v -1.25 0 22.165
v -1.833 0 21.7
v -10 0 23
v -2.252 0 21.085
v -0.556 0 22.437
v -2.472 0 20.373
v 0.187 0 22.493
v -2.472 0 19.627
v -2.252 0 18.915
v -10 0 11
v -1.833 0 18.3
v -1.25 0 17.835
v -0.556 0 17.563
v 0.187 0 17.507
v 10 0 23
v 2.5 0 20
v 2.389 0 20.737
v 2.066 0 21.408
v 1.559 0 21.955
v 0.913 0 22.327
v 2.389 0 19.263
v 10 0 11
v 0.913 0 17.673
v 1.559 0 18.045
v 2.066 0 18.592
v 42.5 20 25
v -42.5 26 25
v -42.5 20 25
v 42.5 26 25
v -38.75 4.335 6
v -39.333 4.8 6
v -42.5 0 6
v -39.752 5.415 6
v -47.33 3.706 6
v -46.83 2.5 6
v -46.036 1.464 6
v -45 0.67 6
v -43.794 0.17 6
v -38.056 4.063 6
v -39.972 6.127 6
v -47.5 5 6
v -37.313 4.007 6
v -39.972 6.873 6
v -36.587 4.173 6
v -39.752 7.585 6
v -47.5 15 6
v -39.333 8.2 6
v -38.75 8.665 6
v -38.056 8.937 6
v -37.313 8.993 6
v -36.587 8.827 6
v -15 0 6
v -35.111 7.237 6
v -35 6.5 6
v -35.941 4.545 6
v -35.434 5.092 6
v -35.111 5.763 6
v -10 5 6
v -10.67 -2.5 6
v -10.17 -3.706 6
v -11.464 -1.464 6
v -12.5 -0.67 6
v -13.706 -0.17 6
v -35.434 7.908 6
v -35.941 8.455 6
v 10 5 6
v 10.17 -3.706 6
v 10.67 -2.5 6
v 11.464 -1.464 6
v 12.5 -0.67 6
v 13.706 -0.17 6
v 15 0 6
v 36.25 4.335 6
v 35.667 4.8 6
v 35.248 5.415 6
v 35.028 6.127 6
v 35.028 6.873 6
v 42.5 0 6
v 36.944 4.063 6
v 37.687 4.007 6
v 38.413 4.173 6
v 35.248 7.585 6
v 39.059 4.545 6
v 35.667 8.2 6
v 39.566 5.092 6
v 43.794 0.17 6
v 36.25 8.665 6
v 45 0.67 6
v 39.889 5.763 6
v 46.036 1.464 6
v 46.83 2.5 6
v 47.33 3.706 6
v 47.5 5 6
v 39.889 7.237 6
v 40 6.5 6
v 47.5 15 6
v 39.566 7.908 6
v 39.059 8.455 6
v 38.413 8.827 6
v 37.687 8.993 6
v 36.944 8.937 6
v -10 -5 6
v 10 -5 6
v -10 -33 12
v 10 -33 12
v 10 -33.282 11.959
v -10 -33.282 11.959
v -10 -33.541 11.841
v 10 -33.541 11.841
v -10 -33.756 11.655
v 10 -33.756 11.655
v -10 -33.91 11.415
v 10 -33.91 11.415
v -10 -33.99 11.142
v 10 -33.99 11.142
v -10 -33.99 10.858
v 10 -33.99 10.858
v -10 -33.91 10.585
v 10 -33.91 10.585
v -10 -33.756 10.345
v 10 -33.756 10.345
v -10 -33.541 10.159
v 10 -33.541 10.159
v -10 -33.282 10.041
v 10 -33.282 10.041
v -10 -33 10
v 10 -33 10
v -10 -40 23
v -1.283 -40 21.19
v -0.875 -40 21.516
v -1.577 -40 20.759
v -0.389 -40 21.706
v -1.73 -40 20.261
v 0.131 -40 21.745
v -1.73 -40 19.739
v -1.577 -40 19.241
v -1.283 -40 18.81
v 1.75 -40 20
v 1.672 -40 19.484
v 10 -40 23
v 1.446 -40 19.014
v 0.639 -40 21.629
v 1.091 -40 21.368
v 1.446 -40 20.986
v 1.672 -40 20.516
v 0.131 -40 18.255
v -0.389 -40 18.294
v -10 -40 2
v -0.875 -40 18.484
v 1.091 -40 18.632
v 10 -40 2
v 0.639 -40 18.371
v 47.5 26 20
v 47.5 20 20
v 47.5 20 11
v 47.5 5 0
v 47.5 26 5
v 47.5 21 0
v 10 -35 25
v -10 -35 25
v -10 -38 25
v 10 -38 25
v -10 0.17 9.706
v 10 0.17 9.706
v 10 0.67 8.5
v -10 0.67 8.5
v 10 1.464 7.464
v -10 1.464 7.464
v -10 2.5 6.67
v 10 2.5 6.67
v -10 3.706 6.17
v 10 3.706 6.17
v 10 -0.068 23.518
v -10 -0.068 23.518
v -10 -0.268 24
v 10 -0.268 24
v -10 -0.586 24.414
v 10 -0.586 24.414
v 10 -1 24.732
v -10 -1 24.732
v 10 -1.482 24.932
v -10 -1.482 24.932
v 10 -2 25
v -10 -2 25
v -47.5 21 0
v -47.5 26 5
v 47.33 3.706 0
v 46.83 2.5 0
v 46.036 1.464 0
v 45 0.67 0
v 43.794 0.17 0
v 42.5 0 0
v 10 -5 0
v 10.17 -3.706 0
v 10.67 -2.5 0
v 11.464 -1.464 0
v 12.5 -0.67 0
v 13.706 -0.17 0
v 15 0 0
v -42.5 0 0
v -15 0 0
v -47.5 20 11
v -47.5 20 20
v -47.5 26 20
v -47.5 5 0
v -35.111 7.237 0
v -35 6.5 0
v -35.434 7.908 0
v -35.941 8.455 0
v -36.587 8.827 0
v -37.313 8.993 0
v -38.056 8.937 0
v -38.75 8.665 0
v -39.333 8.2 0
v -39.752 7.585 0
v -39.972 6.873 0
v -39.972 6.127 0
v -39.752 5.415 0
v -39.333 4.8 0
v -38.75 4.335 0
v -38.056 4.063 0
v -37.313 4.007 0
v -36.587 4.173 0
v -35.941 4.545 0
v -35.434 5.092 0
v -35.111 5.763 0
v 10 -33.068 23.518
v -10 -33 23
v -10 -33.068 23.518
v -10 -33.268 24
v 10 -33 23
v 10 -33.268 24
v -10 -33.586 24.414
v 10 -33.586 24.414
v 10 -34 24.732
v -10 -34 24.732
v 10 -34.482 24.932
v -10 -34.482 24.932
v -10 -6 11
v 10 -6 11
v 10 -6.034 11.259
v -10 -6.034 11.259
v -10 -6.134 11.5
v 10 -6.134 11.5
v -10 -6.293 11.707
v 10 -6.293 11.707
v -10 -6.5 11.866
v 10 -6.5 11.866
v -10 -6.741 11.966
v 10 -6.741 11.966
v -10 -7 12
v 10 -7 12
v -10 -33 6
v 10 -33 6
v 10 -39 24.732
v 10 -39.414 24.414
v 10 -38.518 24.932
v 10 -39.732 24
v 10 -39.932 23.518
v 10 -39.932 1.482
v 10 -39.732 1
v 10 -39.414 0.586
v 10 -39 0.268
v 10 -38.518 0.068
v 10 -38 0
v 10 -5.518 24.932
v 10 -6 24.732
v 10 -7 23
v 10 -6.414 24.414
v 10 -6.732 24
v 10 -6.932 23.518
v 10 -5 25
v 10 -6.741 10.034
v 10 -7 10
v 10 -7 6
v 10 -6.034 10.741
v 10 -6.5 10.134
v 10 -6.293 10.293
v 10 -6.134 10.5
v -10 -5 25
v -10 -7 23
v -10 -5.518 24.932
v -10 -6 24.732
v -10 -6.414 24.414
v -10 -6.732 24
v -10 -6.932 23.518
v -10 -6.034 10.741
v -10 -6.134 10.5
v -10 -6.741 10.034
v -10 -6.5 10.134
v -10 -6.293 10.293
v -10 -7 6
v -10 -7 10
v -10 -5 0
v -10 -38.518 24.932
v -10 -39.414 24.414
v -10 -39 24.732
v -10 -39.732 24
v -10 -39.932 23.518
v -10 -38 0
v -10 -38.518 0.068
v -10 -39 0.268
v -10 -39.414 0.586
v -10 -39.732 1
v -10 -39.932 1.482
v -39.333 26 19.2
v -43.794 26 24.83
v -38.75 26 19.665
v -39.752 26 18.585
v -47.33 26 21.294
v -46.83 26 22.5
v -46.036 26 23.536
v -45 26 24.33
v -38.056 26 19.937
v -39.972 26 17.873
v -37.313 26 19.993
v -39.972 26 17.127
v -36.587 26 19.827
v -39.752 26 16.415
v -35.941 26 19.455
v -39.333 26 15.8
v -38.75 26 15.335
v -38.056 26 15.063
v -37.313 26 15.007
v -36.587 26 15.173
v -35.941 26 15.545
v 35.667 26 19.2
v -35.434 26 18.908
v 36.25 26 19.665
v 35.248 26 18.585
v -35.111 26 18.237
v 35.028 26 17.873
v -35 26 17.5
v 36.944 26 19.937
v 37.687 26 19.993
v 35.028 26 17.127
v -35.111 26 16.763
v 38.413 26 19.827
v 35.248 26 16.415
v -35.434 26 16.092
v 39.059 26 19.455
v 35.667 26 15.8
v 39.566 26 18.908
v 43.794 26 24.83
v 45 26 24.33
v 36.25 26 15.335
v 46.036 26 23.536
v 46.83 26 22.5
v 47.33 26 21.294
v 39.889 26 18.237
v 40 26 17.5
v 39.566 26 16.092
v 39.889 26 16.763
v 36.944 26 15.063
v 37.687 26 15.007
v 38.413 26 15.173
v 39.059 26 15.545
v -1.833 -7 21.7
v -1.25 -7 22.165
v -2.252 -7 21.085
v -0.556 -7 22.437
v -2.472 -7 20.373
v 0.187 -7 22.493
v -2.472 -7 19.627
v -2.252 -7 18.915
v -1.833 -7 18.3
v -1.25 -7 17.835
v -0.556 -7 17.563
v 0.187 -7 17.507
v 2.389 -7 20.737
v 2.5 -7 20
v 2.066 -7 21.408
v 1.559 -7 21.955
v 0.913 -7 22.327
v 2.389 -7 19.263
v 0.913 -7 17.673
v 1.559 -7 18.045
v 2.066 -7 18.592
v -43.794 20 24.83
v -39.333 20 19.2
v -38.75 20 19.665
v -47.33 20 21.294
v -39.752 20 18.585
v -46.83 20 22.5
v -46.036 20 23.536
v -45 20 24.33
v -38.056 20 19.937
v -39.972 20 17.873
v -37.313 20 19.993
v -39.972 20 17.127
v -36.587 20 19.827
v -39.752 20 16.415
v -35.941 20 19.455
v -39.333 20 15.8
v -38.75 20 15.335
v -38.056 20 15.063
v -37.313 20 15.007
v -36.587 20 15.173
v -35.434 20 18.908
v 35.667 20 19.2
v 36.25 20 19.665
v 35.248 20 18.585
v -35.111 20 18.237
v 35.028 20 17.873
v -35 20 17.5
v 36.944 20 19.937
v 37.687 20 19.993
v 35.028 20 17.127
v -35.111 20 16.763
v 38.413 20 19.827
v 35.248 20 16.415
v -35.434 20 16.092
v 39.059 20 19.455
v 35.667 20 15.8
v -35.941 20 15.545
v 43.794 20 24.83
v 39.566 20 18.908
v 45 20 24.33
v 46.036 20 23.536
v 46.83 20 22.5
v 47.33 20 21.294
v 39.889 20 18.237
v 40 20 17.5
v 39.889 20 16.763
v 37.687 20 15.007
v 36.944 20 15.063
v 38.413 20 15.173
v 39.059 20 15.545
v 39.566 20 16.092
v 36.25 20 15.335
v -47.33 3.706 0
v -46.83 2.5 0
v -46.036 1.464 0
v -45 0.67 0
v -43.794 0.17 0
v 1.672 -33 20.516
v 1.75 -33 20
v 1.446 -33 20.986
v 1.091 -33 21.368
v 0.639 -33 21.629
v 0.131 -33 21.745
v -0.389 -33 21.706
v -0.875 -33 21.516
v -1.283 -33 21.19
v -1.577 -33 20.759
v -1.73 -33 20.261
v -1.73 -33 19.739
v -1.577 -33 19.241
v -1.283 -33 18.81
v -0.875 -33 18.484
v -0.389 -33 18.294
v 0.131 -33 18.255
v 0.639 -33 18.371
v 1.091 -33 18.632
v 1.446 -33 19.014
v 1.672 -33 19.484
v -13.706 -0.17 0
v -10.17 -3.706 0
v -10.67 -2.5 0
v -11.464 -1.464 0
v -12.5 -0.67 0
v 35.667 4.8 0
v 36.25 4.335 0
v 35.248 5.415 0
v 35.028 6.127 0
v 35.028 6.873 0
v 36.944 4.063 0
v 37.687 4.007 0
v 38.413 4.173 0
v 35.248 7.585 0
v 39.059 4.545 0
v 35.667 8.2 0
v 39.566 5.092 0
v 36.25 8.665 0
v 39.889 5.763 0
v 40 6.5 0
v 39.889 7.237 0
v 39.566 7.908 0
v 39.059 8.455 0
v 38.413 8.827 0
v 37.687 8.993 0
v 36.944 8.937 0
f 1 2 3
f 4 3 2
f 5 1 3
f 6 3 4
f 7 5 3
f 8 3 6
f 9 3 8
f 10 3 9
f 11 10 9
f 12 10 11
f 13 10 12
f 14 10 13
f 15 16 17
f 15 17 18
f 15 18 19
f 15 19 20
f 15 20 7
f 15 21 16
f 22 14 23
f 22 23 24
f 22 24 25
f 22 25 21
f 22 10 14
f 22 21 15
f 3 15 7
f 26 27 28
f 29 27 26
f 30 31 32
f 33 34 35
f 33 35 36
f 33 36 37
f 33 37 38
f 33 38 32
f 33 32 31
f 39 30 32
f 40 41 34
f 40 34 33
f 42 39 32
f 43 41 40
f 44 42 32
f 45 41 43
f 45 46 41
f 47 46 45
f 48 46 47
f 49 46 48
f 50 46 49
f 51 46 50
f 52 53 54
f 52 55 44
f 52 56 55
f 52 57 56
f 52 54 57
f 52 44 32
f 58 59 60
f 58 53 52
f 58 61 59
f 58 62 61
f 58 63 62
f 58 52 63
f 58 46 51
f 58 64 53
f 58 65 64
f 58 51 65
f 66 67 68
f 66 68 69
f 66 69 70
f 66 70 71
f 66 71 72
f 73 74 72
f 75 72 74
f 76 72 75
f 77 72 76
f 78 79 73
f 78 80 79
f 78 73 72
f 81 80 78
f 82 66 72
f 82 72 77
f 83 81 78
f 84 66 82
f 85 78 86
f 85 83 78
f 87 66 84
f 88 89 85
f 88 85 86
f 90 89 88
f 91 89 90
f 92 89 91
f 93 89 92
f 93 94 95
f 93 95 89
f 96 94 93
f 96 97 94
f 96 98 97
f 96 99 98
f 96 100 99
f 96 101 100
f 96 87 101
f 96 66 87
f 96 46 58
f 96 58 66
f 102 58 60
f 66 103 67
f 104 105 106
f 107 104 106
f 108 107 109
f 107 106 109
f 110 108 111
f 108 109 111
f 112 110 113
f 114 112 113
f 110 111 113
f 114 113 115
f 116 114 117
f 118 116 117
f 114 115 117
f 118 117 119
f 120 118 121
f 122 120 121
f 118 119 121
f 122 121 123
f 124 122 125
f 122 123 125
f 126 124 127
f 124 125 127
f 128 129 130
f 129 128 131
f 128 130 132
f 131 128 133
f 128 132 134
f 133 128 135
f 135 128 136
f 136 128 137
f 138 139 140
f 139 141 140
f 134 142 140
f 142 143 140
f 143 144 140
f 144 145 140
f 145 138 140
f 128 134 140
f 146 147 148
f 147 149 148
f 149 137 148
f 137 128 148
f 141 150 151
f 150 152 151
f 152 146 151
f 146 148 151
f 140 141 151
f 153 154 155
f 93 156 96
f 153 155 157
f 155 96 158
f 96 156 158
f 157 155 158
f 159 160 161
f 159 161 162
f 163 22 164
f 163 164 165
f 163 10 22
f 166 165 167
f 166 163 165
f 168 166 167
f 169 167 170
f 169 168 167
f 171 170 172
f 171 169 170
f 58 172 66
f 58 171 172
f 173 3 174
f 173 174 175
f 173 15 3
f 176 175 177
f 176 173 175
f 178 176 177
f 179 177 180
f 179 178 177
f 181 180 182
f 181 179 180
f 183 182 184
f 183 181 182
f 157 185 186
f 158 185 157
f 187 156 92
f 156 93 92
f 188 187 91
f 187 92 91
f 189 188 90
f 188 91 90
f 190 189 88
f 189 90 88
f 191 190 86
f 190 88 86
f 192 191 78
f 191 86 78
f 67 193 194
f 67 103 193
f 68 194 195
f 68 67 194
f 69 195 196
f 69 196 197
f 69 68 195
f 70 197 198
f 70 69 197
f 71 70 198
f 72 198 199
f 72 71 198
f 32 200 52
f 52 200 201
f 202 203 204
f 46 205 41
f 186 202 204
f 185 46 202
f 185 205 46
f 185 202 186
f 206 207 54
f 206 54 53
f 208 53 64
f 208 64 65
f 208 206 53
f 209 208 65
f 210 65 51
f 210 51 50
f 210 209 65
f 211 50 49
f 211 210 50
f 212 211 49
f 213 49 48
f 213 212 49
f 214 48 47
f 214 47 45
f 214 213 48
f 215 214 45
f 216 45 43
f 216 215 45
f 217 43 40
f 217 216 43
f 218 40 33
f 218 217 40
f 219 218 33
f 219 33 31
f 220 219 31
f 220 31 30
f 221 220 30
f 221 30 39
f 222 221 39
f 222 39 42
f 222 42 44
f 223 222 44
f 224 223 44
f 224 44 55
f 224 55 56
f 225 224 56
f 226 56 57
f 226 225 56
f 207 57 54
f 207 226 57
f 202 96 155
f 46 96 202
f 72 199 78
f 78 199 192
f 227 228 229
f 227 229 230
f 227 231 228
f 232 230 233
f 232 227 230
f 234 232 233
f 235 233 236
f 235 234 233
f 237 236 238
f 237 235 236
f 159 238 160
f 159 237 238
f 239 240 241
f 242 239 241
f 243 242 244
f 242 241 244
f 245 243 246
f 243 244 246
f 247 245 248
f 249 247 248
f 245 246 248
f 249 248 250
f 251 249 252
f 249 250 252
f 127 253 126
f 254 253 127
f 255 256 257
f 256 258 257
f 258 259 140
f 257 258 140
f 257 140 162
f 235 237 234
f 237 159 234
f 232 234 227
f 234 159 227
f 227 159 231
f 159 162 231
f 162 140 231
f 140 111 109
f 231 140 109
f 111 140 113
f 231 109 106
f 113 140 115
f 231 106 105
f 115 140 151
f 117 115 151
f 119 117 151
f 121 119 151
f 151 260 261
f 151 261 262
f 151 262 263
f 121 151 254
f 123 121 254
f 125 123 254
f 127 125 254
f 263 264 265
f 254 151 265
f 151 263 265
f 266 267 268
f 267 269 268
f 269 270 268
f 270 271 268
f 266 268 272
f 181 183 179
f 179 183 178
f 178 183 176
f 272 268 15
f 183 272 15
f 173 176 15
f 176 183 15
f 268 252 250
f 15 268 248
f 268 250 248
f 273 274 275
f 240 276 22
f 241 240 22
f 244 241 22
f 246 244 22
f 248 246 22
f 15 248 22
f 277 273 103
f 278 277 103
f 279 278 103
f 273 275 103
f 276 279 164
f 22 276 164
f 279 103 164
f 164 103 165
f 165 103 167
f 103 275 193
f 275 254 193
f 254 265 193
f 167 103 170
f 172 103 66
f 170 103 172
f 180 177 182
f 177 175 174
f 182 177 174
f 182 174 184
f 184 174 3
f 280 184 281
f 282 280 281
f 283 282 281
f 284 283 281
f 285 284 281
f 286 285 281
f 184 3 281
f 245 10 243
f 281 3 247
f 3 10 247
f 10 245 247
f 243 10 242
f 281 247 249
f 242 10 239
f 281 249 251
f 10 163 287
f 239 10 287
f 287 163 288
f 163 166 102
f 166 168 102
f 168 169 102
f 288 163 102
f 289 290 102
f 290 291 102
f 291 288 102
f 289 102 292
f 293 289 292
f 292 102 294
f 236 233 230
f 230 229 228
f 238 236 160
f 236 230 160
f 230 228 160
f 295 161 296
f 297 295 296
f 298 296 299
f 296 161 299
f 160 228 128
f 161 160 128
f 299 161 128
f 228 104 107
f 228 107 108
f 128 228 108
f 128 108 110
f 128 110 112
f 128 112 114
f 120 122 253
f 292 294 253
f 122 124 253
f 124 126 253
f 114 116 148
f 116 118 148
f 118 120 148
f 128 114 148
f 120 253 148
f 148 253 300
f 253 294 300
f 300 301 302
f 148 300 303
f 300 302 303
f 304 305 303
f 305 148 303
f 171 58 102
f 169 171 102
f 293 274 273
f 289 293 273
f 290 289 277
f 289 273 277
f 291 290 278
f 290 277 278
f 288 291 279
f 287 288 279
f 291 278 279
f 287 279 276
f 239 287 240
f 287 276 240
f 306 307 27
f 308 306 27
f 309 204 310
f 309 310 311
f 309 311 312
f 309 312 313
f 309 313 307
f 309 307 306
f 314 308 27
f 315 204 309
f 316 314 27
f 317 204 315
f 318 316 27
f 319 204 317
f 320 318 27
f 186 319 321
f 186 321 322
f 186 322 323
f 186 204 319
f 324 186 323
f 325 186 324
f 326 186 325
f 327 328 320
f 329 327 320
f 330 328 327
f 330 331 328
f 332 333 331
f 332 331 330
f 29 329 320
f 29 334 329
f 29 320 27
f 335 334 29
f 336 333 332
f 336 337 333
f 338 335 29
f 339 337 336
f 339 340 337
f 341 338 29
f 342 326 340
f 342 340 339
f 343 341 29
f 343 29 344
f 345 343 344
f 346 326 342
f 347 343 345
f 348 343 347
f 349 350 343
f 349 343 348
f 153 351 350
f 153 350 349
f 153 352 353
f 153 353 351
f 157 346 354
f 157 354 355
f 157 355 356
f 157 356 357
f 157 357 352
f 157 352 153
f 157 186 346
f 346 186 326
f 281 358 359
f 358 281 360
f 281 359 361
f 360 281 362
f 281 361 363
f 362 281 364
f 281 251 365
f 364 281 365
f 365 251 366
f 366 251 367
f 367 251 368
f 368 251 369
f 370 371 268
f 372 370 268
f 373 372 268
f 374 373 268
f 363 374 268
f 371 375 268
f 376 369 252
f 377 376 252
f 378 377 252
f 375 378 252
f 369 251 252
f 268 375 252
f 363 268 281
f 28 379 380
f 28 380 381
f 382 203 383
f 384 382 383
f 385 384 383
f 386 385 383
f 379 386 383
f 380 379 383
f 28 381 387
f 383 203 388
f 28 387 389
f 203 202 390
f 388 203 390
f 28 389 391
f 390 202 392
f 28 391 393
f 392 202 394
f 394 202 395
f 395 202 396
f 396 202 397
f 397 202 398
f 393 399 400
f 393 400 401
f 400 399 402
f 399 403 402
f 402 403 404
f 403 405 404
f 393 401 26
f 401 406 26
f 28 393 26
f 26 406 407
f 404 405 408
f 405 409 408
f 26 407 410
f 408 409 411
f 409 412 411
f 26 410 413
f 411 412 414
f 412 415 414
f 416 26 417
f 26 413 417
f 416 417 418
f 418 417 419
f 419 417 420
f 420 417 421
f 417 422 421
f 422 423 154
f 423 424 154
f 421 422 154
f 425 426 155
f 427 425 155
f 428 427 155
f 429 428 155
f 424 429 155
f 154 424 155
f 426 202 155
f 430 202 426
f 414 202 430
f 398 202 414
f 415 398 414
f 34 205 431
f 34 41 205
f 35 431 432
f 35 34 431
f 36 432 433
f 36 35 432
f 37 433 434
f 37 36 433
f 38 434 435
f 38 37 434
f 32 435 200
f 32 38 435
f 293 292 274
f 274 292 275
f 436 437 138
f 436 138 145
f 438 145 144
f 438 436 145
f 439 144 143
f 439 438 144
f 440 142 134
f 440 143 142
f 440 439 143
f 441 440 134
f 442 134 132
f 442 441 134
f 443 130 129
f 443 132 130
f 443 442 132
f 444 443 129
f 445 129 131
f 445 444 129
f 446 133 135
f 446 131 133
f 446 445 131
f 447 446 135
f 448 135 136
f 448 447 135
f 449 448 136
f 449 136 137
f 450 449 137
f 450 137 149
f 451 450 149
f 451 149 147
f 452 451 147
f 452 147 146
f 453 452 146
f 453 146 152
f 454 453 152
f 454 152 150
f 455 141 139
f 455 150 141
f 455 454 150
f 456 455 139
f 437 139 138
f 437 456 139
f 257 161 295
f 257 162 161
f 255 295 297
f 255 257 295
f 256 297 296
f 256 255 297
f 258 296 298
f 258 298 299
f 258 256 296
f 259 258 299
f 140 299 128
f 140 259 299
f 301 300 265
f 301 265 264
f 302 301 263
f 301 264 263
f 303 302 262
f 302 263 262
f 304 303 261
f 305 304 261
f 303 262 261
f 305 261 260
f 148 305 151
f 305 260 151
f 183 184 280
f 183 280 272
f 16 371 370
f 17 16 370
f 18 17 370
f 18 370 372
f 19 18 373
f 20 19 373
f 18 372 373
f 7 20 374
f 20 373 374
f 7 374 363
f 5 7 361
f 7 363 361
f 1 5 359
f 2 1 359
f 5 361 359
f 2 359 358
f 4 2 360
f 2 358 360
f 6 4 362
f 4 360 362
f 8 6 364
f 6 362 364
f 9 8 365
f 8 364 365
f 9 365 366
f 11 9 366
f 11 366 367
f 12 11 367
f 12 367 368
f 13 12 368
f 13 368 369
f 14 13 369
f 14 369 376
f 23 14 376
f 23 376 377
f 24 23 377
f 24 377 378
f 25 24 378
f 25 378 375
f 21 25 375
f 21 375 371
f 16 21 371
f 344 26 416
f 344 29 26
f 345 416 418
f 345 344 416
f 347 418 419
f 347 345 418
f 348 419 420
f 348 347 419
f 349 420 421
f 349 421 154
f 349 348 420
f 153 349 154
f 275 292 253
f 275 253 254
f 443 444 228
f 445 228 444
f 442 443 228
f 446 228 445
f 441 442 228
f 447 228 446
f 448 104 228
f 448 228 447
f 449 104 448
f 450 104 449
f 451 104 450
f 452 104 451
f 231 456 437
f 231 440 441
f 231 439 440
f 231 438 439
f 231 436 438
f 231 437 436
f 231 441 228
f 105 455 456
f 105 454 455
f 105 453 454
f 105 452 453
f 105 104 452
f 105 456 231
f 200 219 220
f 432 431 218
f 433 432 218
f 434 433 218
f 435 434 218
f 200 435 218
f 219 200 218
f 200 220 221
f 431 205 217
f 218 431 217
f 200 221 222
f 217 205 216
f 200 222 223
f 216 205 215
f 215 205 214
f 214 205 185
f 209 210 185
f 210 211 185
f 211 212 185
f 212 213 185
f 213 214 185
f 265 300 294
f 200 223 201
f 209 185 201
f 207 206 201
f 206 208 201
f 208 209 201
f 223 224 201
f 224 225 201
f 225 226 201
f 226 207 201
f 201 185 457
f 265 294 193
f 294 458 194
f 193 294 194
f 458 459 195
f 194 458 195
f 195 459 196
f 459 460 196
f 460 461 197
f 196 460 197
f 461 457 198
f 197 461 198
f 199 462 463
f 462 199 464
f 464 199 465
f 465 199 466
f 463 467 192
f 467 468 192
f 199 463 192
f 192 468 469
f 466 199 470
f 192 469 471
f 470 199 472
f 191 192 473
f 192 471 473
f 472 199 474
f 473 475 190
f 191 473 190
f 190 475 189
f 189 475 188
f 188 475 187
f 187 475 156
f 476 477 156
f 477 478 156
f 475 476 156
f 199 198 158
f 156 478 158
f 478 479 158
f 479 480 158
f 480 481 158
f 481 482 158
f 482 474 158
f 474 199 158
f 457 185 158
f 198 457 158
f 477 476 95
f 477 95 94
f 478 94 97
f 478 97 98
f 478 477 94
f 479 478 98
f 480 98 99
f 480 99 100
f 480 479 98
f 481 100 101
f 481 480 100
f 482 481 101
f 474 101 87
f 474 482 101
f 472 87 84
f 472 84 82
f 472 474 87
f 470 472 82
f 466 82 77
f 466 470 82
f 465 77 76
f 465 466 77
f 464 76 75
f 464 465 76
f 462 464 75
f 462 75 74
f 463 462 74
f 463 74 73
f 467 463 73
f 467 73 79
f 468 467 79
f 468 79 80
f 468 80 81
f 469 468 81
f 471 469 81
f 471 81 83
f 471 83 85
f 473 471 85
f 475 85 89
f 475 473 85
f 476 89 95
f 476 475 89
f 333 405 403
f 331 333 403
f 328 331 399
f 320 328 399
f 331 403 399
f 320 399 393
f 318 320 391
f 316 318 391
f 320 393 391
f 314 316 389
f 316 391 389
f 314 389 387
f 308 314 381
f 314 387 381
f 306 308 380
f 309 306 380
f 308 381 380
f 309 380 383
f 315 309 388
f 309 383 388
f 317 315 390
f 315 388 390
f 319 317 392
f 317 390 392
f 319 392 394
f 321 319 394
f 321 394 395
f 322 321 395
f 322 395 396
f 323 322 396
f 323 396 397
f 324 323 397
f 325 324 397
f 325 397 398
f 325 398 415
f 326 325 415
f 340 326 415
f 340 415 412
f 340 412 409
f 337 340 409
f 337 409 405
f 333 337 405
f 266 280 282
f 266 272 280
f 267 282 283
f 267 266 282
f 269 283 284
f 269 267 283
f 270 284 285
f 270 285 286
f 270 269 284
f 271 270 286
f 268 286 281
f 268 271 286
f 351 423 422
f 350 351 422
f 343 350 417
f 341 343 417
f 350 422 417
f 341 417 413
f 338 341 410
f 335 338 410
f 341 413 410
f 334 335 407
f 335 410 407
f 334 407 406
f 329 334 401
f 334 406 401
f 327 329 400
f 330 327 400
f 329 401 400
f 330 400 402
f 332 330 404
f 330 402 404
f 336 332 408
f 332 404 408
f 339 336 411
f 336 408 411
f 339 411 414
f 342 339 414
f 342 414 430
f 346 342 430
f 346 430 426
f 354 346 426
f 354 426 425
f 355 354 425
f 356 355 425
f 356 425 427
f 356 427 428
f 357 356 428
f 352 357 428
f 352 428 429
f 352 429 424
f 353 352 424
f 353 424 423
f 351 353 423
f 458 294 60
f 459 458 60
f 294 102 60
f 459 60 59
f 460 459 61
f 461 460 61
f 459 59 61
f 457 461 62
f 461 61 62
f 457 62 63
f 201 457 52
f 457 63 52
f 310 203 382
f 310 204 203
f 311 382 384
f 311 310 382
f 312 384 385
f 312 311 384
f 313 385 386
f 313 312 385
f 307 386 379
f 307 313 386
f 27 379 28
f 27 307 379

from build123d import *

# Parameters (mm, degrees)
F0_R      = 2.5
F0_W      = 20
F0_H      = 26
F0_H_2    = 7
F1_DEPTH  = 6
F0_W_2    = 95
F0_H_3    = 6
F2_DEPTH  = 25
F3_R      = 2.5
F4_DEPTH  = 25
F5_SIZE   = 5
F6_R      = 5
F7_DEPTH  = 25
F9_DEPTH  = 25
F10_R     = 1.75
F11_DEPTH = 50
F10_R_2   = 2.5
F12_DEPTH = 10
F13_R     = 2
F14_R     = 5
F15_R     = 5


with BuildPart() as f1:
    # F0 (on Top) → F1 (new body)
    with BuildSketch(Plane.XY):
        Polygon((-47.5, 20), (-47.5, 0), (-10, 0), (10, 0), (47.5, 0), (47.5, 20), align=None)
        with Locations((-37.5, 6.5)):
            Circle(F0_R, mode=Mode.SUBTRACT)
        with Locations((37.5, 6.5)):
            Circle(F0_R, mode=Mode.SUBTRACT)
        with Locations((0, -20)):
            Rectangle(F0_W, F0_H)
        with Locations((0, -36.5)):
            Rectangle(F0_W, F0_H_2)
        with Locations((0, -3.5)):
            Rectangle(F0_W, F0_H_2)
    extrude(amount=F1_DEPTH)

    # F0 (on Top) → F2 (join)
    with BuildSketch(Plane.XY):
        with Locations((0, 23)):
            Rectangle(F0_W_2, F0_H_3)
    extrude(amount=F2_DEPTH)

    # F3 (on face) → F4 (cut)
    with BuildSketch(Plane.XZ.offset(-20)):
        with Locations((-37.5, 17.5)):
            Circle(F3_R)
        with Locations((37.5, 17.5)):
            Circle(F3_R)
    extrude(amount=-F4_DEPTH, mode=Mode.SUBTRACT)

    # F5
    f5_edges = [f1.edges().sort_by_distance(p)[0] for p in [
        (0, 20, 6),
        (0, 26, 0),
    ]]
    chamfer(f5_edges, length=F5_SIZE)

    # F6
    f6_edges = [f1.edges().sort_by_distance(p)[0] for p in [
        (47.5, 23, 25),
        (47.5, 0, 3),
        (-47.5, 0, 3),
        (-47.5, 23, 25),
    ]]
    fillet(f6_edges, radius=F6_R)

    # F0 (on Top) → F7 (join)
    with BuildSketch(Plane.XY):
        with Locations((0, -3.5)):
            Rectangle(F0_W, F0_H_2)
        with Locations((0, -36.5)):
            Rectangle(F0_W, F0_H_2)
    extrude(amount=F7_DEPTH)

    # F8 (on face) → F9 (cut)
    with BuildSketch(Plane.YZ.offset(10)):
        with BuildLine():
            Line((-33, 10), (-33, 12))
            ThreePointArc((-33, 12), (-34, 11), (-33, 10))
        make_face()
        with BuildLine():
            Line((-7, 12), (-7, 10))
            ThreePointArc((-7, 10), (-6.2928932188, 10.2928932188), (-6, 11))
            ThreePointArc((-6, 11), (-6.2928932188, 11.7071067812), (-7, 12))
        make_face()
    extrude(amount=-F9_DEPTH, mode=Mode.SUBTRACT)

    # F10 (on face) → F11 (cut)
    with BuildSketch(Plane.XZ.offset(7)):
        with Locations((0, 20)):
            Circle(F10_R)
    extrude(amount=F11_DEPTH, mode=Mode.SUBTRACT)

    # F10 (on face) → F12 (cut)
    with BuildSketch(Plane.XZ.offset(7)):
        with Locations((0, 20)):
            Circle(F10_R_2)
        with Locations((0, 20)):
            Circle(F10_R, mode=Mode.SUBTRACT)
        with Locations((0, 20)):
            Circle(F10_R)
    extrude(amount=-F12_DEPTH, mode=Mode.SUBTRACT)

    # F13
    f13_edges = [f1.edges().sort_by_distance(p)[0] for p in [
        (0, -7, 25),
        (0, 0, 25),
        (0, -33, 25),
        (0, -40, 25),
        (0, -40, 0),
    ]]
    fillet(f13_edges, radius=F13_R)

    # F14
    f14_edges = [f1.edges().sort_by_distance(p)[0] for p in [
        (0, 0, 6),
    ]]
    fillet(f14_edges, radius=F14_R)

    # F15
    f15_edges = [f1.edges().sort_by_distance(p)[0] for p in [
        (10, 0, 3),
        (-10, 0, 3),
    ]]
    fillet(f15_edges, radius=F15_R)


solid = f1.part
